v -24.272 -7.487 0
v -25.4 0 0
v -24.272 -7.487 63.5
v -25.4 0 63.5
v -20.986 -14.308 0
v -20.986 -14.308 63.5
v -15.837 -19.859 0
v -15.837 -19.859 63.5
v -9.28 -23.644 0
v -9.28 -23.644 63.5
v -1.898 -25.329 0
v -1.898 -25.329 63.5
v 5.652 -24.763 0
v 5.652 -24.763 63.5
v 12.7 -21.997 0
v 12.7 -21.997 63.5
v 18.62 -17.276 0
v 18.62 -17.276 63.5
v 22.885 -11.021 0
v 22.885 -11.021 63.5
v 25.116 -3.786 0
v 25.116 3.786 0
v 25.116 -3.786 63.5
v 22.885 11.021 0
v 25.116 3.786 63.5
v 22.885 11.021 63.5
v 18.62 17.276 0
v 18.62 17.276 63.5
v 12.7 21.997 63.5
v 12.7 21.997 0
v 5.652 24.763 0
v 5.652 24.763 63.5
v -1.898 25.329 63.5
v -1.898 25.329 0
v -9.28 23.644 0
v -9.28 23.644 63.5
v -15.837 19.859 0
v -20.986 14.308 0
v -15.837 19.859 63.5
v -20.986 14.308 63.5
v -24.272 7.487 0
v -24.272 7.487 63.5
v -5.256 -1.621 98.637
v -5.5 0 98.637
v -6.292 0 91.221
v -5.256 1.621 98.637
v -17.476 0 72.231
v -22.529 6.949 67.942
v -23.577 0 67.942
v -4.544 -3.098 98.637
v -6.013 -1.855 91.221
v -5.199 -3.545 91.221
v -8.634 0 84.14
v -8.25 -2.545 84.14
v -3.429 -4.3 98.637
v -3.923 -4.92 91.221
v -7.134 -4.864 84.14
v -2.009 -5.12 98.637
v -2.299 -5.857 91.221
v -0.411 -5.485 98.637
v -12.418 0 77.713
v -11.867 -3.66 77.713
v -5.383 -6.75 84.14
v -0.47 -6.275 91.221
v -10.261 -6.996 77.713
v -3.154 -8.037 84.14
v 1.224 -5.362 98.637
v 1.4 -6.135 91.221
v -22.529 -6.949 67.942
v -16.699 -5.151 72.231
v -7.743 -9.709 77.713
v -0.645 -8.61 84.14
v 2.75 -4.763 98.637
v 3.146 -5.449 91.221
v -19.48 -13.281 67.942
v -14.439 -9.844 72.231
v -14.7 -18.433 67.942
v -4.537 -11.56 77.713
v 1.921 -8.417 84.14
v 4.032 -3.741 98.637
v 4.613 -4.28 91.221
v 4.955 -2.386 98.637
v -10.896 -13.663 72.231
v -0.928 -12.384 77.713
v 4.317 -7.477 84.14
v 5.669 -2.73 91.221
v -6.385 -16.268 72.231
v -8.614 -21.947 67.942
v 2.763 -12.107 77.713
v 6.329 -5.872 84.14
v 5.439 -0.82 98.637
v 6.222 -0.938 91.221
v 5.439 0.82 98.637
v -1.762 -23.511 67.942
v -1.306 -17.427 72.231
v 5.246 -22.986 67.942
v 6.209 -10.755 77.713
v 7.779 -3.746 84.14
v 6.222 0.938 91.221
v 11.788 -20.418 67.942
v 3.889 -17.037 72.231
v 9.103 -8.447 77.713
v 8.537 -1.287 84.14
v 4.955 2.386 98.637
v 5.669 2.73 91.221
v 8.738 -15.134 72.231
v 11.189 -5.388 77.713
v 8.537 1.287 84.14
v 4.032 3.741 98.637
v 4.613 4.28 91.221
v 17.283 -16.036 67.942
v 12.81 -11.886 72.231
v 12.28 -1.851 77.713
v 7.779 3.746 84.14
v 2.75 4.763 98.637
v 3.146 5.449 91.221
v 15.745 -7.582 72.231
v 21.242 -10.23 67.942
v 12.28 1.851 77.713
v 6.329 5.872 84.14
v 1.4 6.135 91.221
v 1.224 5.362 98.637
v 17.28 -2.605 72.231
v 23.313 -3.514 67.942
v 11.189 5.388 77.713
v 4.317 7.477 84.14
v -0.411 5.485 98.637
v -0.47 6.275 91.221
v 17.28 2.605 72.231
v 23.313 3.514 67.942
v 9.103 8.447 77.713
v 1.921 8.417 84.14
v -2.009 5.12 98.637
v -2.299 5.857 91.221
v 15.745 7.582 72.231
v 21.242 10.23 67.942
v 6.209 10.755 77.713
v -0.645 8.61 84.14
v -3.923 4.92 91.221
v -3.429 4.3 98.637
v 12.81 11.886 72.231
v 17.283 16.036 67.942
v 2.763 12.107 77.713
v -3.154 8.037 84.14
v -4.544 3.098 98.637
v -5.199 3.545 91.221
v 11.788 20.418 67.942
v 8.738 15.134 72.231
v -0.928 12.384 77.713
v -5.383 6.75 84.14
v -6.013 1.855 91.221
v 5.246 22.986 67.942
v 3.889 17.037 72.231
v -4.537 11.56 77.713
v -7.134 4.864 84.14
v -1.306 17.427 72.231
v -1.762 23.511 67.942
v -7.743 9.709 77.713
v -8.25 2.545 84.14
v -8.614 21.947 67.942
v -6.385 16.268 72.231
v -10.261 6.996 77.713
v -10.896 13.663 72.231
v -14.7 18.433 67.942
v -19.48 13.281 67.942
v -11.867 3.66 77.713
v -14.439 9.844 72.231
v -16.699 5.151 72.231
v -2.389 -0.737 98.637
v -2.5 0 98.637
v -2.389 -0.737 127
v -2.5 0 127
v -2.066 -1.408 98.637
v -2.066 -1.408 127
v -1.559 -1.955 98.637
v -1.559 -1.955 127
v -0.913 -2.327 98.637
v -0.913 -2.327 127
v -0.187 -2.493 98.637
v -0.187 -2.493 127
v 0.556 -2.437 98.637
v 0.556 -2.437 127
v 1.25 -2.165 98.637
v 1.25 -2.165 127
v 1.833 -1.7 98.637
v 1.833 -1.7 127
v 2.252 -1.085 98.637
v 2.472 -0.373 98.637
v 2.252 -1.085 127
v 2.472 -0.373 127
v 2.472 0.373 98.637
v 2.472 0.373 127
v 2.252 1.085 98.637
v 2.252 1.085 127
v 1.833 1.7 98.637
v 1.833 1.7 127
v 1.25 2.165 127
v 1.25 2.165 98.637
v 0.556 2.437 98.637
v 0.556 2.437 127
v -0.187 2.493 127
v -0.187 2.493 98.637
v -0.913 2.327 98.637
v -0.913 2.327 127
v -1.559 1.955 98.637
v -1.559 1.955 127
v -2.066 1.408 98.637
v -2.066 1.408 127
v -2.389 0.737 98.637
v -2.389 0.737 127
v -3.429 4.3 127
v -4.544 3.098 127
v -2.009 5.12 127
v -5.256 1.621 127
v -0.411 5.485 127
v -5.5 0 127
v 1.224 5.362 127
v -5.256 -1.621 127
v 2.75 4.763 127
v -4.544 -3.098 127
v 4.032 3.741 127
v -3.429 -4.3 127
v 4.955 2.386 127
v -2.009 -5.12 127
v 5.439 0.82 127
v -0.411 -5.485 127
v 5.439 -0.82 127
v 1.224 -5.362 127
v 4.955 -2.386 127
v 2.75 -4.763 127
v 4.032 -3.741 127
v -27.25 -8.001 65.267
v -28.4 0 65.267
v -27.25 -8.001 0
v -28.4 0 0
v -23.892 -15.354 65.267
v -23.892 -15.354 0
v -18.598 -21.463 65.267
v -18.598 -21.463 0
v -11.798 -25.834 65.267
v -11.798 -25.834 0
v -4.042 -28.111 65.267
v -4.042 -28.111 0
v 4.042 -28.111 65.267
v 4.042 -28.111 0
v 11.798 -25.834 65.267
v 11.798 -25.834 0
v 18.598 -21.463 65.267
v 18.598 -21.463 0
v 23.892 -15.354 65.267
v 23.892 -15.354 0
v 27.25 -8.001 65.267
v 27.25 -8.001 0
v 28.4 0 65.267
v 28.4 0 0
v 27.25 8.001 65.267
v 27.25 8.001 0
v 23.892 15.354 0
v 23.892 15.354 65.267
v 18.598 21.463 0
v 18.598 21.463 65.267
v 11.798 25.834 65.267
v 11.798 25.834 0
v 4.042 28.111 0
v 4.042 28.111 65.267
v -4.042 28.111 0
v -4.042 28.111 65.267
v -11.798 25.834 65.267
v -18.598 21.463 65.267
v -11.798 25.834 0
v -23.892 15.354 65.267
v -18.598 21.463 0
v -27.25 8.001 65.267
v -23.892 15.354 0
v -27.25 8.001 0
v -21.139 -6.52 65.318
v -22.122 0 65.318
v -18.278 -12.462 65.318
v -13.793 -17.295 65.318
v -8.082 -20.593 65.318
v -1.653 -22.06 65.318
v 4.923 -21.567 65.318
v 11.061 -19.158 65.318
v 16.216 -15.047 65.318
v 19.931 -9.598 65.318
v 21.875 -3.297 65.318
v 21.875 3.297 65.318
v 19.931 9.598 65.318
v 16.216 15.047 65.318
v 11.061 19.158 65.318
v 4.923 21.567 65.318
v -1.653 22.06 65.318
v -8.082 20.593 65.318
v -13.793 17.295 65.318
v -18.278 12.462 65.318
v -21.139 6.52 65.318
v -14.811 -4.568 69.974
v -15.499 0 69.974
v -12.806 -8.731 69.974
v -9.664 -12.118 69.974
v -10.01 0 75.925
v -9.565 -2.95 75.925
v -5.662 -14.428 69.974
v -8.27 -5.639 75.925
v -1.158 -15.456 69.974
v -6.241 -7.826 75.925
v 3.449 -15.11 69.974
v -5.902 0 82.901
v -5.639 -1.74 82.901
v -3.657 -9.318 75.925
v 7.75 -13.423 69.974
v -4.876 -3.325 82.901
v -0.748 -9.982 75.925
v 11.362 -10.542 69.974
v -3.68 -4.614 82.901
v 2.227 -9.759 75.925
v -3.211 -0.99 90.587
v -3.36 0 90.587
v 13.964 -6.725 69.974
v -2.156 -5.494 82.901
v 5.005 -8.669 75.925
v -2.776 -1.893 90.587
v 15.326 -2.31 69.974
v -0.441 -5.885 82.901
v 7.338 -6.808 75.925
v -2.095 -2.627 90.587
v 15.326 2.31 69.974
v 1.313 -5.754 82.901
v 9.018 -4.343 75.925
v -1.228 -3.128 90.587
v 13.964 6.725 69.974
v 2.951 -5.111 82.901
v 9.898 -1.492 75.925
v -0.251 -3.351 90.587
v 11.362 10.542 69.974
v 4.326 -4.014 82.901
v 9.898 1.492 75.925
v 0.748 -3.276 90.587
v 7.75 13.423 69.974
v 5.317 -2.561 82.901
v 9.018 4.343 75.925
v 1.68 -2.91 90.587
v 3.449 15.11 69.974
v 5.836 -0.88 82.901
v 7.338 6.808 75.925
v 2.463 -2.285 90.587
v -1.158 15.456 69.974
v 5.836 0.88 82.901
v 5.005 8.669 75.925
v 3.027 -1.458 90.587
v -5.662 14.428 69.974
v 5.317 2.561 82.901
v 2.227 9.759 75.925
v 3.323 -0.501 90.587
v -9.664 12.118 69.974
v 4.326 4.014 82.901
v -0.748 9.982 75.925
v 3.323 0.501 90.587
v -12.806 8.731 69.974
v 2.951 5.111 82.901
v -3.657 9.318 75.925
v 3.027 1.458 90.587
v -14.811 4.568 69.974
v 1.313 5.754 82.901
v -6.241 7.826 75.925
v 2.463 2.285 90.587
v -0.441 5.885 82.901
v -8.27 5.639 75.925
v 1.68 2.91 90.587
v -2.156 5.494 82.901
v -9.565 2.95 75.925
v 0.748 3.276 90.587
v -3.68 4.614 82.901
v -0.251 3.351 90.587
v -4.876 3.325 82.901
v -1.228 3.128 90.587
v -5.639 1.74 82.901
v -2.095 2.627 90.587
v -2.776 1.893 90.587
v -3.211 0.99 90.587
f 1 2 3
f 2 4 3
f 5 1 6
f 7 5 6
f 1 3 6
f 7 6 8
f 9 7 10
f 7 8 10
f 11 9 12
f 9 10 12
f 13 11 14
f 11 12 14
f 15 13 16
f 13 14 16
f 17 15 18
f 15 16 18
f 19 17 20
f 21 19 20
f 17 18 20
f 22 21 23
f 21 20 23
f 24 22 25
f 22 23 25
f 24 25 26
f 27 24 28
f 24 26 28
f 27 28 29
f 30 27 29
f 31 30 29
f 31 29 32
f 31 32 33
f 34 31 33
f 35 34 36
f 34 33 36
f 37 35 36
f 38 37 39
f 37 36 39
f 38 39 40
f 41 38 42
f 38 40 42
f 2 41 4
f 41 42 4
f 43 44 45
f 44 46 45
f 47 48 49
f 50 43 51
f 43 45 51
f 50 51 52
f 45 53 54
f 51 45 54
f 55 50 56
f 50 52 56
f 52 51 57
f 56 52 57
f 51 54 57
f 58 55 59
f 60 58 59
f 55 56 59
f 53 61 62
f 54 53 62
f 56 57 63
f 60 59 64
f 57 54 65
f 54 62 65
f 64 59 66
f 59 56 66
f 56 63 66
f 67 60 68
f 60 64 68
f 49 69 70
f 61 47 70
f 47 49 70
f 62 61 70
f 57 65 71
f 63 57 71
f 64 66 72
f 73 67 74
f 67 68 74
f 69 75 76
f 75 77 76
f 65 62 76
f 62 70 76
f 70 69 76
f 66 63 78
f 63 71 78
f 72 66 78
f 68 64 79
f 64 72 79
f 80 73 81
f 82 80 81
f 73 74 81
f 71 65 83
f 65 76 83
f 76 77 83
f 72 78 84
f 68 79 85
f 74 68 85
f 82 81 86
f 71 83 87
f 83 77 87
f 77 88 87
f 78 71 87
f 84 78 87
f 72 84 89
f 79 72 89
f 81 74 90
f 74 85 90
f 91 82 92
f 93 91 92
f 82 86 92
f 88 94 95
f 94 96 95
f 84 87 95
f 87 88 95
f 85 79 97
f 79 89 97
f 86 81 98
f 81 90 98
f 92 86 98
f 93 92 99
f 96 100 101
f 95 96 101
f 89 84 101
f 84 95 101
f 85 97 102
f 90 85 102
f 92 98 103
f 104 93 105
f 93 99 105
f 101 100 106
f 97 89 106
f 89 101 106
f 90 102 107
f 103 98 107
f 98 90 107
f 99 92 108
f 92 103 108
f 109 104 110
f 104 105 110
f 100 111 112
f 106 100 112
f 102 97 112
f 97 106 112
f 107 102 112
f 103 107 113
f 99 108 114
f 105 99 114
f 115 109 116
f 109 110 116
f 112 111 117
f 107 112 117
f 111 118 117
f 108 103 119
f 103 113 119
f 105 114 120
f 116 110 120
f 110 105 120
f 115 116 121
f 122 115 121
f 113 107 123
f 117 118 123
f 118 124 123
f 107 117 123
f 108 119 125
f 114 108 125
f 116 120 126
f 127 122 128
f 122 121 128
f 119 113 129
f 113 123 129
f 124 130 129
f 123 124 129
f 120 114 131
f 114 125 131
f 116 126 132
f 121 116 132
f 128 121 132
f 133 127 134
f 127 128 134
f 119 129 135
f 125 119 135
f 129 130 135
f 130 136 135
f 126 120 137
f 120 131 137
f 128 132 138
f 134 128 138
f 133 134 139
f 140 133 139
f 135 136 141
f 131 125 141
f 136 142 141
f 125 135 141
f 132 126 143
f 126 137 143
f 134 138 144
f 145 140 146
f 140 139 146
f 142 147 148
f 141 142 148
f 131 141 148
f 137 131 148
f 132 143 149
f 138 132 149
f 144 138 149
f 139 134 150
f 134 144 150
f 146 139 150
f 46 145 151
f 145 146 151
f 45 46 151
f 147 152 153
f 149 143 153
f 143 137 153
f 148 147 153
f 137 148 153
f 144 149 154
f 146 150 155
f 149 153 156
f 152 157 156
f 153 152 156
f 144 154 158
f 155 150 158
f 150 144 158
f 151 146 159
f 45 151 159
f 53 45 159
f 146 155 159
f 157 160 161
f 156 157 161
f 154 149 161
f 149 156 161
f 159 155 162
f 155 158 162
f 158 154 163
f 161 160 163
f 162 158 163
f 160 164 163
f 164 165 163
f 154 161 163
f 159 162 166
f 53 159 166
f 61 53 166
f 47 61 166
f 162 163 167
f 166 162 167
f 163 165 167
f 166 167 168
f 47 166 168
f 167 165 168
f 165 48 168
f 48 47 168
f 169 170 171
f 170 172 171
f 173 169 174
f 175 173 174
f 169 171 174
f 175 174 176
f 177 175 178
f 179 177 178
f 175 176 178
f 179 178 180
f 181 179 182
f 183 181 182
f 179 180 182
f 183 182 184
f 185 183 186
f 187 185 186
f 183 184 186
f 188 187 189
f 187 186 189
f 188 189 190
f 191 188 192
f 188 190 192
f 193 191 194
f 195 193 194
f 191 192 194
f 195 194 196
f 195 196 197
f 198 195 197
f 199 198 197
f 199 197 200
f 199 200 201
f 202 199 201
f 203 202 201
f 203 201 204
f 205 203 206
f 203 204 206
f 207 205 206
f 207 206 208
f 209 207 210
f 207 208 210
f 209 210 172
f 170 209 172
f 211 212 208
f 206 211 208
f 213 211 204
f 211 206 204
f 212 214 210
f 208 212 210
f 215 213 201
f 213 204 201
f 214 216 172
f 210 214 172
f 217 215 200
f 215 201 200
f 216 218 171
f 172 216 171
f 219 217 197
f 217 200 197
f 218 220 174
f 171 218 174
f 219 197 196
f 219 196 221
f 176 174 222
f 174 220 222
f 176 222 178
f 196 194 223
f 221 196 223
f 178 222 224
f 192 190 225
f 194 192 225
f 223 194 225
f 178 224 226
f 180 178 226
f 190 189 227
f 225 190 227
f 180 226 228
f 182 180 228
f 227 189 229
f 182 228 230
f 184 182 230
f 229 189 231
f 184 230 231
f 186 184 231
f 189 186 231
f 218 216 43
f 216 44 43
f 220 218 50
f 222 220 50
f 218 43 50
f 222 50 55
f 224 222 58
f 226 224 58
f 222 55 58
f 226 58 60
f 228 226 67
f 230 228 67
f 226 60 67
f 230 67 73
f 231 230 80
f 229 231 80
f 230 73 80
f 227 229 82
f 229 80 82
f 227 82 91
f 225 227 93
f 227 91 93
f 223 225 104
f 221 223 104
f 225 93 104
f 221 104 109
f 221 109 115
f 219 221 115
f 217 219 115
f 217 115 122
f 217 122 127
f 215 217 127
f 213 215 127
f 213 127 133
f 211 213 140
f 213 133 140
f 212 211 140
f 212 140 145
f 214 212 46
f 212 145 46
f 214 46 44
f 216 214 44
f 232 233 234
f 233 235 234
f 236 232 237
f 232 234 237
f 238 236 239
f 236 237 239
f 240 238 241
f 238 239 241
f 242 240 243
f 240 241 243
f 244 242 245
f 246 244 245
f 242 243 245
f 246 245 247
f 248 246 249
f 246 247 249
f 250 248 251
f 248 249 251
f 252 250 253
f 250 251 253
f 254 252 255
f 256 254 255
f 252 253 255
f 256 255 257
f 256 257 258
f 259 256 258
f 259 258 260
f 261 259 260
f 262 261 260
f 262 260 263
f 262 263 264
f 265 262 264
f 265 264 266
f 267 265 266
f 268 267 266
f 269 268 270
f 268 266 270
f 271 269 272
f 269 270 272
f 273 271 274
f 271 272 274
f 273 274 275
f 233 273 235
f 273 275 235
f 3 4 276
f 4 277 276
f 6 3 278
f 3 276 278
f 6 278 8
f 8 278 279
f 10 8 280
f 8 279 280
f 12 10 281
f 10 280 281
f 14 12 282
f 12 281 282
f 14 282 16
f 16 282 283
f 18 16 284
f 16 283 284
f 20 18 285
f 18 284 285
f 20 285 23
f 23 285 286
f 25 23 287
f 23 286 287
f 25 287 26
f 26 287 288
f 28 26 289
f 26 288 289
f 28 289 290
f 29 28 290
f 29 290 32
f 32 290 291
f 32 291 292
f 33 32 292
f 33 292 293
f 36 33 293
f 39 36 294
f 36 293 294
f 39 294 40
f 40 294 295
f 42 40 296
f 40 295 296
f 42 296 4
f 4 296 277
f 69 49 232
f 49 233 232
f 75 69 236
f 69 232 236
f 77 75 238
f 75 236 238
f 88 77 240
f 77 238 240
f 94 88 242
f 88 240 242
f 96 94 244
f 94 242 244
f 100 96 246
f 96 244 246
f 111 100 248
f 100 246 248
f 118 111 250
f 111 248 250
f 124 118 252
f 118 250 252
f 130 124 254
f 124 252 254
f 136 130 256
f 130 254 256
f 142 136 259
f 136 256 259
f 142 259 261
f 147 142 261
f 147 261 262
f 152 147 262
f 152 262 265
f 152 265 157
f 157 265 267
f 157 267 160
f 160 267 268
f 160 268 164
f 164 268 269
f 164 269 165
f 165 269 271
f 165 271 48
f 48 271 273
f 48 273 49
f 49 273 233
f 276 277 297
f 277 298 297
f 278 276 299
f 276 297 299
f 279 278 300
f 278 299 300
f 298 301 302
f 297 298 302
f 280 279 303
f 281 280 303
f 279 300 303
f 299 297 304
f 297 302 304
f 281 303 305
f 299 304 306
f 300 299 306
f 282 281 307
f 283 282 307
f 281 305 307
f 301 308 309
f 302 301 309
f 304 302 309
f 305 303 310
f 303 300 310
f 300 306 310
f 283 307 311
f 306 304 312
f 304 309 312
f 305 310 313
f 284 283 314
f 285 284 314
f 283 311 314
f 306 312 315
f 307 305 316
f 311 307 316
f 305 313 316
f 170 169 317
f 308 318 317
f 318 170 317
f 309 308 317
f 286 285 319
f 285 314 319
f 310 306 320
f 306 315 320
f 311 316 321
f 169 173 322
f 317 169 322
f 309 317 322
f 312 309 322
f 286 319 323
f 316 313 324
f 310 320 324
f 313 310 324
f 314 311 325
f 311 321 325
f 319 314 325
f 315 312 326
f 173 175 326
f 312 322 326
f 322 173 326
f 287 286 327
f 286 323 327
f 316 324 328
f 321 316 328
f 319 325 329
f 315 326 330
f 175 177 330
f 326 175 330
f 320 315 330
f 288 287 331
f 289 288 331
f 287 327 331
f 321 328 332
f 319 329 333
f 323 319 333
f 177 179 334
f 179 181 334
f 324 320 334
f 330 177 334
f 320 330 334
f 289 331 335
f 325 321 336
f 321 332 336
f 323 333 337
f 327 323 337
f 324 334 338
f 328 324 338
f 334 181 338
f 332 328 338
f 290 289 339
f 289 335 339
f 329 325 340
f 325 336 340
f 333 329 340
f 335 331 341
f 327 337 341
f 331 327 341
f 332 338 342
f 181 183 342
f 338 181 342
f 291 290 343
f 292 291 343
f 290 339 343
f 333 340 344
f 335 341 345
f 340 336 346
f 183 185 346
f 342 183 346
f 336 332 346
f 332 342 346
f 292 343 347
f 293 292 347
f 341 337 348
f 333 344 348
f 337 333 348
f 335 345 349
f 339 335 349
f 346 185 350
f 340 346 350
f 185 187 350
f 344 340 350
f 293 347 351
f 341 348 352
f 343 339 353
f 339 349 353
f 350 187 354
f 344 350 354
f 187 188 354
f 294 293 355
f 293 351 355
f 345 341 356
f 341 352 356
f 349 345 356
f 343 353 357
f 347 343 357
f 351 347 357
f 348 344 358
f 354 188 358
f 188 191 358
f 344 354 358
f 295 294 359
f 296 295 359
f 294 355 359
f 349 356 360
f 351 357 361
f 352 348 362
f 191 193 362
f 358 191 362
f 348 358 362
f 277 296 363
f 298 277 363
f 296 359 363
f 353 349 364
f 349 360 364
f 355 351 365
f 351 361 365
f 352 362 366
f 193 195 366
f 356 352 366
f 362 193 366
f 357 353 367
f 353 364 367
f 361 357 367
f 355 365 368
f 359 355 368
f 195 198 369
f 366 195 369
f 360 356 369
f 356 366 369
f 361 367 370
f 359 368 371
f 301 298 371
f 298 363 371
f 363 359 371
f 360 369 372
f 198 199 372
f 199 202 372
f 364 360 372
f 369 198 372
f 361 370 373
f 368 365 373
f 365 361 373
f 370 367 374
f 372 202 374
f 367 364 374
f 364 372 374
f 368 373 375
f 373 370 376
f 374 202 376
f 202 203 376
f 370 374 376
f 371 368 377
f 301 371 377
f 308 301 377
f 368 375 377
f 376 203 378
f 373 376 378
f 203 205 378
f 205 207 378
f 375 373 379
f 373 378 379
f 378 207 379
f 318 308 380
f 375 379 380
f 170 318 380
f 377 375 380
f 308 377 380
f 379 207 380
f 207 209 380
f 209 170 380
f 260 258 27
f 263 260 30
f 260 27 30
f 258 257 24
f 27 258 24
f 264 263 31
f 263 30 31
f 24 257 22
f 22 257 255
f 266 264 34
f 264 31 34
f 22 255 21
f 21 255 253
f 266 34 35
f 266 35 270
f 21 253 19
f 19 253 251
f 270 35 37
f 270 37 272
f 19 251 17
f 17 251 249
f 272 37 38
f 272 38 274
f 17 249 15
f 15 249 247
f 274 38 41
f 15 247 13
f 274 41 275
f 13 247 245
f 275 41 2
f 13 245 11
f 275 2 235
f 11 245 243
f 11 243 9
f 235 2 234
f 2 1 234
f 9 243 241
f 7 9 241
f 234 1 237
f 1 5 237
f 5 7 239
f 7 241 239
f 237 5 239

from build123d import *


with BuildPart() as f2:
    # F0 (on Front) → F2 (revolve)
    with BuildSketch(Plane.XZ):
        with BuildLine():
            Line((-28.4, 0), (-25.4, 0))
            Line((-25.4, 0), (-25.4, 63.5))
            Line((-25.4, 63.5), (-22.121717, 65.318087))
            ThreePointArc((-22.121717, 65.318087), (-7.769887, 79.303451), (-2.5, 98.637197))
            Line((-2.5, 98.637197), (-2.5, 127))
            Line((-2.5, 127), (-5.5, 127))
            Line((-5.5, 127), (-5.5, 98.637197))
            ThreePointArc((-5.5, 98.637197), (-10.354936, 80.825794), (-23.5767, 67.941639))
            Line((-23.5767, 67.941639), (-28.4, 65.266708))
            Line((-28.4, 65.266708), (-28.4, 0))
        make_face()
    revolve(axis=Axis((0, 0, 64.849392), (0, 0, 1)))


solid = f2.part
